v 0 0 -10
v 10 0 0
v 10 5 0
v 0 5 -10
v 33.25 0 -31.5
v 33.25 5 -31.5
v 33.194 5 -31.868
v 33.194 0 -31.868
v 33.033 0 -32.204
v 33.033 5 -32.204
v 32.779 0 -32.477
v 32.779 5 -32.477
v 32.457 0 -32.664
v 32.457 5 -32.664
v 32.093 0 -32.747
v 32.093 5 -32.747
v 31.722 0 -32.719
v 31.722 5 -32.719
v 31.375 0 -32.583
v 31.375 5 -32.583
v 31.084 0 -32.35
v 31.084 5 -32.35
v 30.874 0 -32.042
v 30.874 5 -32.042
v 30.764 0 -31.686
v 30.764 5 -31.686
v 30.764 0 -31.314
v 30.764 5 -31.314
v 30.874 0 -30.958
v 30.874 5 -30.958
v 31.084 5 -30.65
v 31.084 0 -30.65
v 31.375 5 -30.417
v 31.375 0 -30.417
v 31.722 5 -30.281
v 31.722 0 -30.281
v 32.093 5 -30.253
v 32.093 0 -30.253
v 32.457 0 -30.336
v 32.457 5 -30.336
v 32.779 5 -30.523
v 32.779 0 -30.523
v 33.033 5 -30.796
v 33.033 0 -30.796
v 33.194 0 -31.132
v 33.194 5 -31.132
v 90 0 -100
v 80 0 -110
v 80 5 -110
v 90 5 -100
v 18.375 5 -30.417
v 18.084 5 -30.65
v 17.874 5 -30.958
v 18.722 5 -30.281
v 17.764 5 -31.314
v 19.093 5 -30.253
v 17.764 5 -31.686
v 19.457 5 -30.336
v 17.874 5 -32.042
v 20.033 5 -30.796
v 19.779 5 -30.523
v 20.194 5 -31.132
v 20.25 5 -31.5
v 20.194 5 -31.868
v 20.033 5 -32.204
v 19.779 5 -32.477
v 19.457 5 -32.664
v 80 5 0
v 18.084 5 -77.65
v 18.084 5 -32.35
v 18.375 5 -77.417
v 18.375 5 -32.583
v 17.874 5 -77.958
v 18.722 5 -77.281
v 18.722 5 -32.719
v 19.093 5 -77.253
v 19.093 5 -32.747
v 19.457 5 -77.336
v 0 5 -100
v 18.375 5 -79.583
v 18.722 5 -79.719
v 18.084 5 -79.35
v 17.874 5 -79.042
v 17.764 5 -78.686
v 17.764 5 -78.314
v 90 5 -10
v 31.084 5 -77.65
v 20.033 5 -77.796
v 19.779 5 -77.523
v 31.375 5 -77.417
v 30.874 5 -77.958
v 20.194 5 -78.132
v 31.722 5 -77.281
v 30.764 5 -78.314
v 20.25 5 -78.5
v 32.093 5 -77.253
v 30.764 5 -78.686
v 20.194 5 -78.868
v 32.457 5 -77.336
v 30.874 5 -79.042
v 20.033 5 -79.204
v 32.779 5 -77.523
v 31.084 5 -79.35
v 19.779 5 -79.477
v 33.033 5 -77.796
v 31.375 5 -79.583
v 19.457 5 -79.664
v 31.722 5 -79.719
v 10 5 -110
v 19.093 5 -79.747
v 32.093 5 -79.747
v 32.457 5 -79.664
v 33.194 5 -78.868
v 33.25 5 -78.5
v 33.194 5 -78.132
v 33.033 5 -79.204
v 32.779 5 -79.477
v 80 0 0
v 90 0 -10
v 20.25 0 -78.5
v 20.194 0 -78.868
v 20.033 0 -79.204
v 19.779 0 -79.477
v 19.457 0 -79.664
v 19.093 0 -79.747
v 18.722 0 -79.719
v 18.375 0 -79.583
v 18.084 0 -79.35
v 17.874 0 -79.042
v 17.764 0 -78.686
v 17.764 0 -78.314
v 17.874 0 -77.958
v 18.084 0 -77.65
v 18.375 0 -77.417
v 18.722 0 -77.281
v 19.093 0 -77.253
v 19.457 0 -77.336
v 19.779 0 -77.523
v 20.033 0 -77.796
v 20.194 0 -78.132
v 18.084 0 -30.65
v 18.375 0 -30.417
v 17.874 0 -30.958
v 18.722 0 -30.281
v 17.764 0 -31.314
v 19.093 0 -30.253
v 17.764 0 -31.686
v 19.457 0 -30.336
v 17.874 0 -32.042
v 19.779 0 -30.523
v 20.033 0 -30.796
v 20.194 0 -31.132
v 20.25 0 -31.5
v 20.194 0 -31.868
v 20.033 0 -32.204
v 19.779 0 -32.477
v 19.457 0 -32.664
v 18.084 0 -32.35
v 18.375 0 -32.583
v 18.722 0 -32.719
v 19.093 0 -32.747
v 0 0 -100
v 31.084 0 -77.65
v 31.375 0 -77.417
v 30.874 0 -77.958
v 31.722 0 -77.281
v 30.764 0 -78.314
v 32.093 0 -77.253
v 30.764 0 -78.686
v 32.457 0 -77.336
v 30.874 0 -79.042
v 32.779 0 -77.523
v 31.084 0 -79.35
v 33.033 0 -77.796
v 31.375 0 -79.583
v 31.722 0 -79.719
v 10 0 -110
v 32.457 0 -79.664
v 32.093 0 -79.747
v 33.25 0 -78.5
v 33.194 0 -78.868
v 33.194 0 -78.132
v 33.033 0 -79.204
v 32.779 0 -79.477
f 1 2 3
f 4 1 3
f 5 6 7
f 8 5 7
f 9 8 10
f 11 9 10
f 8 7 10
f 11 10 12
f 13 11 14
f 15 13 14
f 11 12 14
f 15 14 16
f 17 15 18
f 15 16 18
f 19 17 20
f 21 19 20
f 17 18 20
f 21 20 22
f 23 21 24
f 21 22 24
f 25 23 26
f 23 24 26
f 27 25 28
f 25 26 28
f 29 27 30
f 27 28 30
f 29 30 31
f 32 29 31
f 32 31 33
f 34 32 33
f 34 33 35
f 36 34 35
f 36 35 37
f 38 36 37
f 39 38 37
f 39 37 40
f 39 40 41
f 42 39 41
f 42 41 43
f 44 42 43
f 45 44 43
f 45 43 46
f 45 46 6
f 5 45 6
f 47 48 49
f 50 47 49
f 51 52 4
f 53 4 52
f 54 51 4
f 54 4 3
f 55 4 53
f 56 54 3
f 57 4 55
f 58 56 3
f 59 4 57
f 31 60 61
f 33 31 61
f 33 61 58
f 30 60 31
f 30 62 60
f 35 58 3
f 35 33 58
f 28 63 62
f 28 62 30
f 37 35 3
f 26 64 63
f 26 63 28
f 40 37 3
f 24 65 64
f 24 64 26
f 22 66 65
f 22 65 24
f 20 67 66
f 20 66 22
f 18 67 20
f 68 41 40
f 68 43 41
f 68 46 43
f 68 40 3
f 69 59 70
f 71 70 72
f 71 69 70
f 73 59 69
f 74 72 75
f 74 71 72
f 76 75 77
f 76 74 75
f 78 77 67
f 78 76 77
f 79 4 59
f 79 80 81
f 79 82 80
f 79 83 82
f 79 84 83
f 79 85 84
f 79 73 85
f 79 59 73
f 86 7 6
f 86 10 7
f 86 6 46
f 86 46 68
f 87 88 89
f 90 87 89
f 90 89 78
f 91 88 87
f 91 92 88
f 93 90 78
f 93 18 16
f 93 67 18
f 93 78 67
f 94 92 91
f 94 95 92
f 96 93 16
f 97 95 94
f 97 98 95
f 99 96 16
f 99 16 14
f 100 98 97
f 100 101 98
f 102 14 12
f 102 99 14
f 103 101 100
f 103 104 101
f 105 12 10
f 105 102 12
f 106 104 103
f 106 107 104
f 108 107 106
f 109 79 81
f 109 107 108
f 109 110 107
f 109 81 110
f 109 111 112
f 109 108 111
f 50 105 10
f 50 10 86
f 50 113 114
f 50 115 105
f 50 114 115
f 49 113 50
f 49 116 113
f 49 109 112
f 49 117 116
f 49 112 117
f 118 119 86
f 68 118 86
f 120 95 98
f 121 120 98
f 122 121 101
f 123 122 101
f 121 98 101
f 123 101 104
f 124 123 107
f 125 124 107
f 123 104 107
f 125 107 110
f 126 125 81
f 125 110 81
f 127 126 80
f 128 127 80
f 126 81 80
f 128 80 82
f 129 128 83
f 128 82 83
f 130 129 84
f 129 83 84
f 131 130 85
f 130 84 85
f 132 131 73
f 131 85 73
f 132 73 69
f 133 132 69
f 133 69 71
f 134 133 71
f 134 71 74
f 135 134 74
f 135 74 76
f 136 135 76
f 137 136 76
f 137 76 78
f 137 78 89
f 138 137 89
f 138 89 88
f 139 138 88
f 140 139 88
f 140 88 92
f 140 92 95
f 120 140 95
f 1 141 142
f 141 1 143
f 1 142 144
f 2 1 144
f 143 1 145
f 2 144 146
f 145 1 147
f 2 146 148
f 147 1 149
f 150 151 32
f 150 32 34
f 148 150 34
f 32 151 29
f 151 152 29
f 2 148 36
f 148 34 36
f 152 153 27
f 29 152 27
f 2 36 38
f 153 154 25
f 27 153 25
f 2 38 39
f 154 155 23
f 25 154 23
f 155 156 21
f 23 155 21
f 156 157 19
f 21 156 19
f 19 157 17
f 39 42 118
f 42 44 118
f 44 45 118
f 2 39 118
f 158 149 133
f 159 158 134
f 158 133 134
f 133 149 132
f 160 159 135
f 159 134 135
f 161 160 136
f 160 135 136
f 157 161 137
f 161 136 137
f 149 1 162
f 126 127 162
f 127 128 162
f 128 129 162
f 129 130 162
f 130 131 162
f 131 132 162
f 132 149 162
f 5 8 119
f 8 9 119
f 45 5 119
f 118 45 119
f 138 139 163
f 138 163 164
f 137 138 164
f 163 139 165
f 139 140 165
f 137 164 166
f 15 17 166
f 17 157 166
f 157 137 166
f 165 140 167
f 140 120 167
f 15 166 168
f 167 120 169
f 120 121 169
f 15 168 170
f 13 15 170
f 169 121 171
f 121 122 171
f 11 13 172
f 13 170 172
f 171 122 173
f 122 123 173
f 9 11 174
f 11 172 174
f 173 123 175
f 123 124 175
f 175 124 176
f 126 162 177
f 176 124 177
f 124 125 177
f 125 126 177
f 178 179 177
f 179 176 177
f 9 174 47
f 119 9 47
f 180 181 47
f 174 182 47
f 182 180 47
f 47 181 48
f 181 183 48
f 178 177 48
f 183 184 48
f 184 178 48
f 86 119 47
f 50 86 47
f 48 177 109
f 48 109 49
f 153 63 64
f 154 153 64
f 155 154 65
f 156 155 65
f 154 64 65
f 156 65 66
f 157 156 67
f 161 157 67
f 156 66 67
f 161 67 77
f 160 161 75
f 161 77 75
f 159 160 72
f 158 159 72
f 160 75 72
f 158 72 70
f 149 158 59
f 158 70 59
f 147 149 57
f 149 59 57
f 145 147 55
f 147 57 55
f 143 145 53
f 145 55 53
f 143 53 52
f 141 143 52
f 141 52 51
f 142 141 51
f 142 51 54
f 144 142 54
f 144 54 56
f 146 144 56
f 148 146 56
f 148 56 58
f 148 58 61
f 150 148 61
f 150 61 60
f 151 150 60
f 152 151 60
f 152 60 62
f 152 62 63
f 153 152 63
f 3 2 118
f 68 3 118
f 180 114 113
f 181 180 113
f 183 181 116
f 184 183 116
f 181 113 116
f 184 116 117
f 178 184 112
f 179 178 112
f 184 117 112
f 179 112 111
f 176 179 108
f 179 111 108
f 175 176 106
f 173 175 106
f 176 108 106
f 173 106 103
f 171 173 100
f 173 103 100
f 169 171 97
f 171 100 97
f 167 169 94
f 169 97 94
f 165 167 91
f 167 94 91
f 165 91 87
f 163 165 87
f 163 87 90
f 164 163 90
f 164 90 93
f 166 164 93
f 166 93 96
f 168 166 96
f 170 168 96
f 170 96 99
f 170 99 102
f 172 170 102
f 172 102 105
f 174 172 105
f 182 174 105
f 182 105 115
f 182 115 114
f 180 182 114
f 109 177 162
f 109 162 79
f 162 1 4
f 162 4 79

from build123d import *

# Parameters (mm, degrees)
SKETCH_1_W         = 90
SKETCH_1_H         = 110
EXTRUDE_1_DEPTH    = 5
CHAMFER_1_SIZE     = 10
HOLE_WIZARD_M3_1_D = 2.5


with BuildPart() as part:
    # 草图1 → 凸台-拉伸1 (new body)
    with BuildSketch(Plane(origin=(0, 0, 0), x_dir=(1, 0, 0), z_dir=(0, 1, 0))):
        with Locations((45, 55)):
            Rectangle(SKETCH_1_W, SKETCH_1_H)
    extrude(amount=EXTRUDE_1_DEPTH)

    # 倒角1
    chamfer_1_edges = [part.edges().sort_by_distance(p)[0] for p in [
        (0, 2.5, 0),
        (0, 2.5, -110),
        (90, 2.5, -110),
        (90, 2.5, 0),
    ]]
    chamfer(chamfer_1_edges, length=CHAMFER_1_SIZE)

    # M3 螺纹孔1 (through all)
    with Locations(Plane(origin=(0, 0, 0), x_dir=(-1, 0, 0), z_dir=(0, -1, 0))):
        with Locations((-19, 78.5), (-19, 31.5), (-32, 31.5), (-32, 78.5)):
            Hole(HOLE_WIZARD_M3_1_D / 2)


solid = part.part
